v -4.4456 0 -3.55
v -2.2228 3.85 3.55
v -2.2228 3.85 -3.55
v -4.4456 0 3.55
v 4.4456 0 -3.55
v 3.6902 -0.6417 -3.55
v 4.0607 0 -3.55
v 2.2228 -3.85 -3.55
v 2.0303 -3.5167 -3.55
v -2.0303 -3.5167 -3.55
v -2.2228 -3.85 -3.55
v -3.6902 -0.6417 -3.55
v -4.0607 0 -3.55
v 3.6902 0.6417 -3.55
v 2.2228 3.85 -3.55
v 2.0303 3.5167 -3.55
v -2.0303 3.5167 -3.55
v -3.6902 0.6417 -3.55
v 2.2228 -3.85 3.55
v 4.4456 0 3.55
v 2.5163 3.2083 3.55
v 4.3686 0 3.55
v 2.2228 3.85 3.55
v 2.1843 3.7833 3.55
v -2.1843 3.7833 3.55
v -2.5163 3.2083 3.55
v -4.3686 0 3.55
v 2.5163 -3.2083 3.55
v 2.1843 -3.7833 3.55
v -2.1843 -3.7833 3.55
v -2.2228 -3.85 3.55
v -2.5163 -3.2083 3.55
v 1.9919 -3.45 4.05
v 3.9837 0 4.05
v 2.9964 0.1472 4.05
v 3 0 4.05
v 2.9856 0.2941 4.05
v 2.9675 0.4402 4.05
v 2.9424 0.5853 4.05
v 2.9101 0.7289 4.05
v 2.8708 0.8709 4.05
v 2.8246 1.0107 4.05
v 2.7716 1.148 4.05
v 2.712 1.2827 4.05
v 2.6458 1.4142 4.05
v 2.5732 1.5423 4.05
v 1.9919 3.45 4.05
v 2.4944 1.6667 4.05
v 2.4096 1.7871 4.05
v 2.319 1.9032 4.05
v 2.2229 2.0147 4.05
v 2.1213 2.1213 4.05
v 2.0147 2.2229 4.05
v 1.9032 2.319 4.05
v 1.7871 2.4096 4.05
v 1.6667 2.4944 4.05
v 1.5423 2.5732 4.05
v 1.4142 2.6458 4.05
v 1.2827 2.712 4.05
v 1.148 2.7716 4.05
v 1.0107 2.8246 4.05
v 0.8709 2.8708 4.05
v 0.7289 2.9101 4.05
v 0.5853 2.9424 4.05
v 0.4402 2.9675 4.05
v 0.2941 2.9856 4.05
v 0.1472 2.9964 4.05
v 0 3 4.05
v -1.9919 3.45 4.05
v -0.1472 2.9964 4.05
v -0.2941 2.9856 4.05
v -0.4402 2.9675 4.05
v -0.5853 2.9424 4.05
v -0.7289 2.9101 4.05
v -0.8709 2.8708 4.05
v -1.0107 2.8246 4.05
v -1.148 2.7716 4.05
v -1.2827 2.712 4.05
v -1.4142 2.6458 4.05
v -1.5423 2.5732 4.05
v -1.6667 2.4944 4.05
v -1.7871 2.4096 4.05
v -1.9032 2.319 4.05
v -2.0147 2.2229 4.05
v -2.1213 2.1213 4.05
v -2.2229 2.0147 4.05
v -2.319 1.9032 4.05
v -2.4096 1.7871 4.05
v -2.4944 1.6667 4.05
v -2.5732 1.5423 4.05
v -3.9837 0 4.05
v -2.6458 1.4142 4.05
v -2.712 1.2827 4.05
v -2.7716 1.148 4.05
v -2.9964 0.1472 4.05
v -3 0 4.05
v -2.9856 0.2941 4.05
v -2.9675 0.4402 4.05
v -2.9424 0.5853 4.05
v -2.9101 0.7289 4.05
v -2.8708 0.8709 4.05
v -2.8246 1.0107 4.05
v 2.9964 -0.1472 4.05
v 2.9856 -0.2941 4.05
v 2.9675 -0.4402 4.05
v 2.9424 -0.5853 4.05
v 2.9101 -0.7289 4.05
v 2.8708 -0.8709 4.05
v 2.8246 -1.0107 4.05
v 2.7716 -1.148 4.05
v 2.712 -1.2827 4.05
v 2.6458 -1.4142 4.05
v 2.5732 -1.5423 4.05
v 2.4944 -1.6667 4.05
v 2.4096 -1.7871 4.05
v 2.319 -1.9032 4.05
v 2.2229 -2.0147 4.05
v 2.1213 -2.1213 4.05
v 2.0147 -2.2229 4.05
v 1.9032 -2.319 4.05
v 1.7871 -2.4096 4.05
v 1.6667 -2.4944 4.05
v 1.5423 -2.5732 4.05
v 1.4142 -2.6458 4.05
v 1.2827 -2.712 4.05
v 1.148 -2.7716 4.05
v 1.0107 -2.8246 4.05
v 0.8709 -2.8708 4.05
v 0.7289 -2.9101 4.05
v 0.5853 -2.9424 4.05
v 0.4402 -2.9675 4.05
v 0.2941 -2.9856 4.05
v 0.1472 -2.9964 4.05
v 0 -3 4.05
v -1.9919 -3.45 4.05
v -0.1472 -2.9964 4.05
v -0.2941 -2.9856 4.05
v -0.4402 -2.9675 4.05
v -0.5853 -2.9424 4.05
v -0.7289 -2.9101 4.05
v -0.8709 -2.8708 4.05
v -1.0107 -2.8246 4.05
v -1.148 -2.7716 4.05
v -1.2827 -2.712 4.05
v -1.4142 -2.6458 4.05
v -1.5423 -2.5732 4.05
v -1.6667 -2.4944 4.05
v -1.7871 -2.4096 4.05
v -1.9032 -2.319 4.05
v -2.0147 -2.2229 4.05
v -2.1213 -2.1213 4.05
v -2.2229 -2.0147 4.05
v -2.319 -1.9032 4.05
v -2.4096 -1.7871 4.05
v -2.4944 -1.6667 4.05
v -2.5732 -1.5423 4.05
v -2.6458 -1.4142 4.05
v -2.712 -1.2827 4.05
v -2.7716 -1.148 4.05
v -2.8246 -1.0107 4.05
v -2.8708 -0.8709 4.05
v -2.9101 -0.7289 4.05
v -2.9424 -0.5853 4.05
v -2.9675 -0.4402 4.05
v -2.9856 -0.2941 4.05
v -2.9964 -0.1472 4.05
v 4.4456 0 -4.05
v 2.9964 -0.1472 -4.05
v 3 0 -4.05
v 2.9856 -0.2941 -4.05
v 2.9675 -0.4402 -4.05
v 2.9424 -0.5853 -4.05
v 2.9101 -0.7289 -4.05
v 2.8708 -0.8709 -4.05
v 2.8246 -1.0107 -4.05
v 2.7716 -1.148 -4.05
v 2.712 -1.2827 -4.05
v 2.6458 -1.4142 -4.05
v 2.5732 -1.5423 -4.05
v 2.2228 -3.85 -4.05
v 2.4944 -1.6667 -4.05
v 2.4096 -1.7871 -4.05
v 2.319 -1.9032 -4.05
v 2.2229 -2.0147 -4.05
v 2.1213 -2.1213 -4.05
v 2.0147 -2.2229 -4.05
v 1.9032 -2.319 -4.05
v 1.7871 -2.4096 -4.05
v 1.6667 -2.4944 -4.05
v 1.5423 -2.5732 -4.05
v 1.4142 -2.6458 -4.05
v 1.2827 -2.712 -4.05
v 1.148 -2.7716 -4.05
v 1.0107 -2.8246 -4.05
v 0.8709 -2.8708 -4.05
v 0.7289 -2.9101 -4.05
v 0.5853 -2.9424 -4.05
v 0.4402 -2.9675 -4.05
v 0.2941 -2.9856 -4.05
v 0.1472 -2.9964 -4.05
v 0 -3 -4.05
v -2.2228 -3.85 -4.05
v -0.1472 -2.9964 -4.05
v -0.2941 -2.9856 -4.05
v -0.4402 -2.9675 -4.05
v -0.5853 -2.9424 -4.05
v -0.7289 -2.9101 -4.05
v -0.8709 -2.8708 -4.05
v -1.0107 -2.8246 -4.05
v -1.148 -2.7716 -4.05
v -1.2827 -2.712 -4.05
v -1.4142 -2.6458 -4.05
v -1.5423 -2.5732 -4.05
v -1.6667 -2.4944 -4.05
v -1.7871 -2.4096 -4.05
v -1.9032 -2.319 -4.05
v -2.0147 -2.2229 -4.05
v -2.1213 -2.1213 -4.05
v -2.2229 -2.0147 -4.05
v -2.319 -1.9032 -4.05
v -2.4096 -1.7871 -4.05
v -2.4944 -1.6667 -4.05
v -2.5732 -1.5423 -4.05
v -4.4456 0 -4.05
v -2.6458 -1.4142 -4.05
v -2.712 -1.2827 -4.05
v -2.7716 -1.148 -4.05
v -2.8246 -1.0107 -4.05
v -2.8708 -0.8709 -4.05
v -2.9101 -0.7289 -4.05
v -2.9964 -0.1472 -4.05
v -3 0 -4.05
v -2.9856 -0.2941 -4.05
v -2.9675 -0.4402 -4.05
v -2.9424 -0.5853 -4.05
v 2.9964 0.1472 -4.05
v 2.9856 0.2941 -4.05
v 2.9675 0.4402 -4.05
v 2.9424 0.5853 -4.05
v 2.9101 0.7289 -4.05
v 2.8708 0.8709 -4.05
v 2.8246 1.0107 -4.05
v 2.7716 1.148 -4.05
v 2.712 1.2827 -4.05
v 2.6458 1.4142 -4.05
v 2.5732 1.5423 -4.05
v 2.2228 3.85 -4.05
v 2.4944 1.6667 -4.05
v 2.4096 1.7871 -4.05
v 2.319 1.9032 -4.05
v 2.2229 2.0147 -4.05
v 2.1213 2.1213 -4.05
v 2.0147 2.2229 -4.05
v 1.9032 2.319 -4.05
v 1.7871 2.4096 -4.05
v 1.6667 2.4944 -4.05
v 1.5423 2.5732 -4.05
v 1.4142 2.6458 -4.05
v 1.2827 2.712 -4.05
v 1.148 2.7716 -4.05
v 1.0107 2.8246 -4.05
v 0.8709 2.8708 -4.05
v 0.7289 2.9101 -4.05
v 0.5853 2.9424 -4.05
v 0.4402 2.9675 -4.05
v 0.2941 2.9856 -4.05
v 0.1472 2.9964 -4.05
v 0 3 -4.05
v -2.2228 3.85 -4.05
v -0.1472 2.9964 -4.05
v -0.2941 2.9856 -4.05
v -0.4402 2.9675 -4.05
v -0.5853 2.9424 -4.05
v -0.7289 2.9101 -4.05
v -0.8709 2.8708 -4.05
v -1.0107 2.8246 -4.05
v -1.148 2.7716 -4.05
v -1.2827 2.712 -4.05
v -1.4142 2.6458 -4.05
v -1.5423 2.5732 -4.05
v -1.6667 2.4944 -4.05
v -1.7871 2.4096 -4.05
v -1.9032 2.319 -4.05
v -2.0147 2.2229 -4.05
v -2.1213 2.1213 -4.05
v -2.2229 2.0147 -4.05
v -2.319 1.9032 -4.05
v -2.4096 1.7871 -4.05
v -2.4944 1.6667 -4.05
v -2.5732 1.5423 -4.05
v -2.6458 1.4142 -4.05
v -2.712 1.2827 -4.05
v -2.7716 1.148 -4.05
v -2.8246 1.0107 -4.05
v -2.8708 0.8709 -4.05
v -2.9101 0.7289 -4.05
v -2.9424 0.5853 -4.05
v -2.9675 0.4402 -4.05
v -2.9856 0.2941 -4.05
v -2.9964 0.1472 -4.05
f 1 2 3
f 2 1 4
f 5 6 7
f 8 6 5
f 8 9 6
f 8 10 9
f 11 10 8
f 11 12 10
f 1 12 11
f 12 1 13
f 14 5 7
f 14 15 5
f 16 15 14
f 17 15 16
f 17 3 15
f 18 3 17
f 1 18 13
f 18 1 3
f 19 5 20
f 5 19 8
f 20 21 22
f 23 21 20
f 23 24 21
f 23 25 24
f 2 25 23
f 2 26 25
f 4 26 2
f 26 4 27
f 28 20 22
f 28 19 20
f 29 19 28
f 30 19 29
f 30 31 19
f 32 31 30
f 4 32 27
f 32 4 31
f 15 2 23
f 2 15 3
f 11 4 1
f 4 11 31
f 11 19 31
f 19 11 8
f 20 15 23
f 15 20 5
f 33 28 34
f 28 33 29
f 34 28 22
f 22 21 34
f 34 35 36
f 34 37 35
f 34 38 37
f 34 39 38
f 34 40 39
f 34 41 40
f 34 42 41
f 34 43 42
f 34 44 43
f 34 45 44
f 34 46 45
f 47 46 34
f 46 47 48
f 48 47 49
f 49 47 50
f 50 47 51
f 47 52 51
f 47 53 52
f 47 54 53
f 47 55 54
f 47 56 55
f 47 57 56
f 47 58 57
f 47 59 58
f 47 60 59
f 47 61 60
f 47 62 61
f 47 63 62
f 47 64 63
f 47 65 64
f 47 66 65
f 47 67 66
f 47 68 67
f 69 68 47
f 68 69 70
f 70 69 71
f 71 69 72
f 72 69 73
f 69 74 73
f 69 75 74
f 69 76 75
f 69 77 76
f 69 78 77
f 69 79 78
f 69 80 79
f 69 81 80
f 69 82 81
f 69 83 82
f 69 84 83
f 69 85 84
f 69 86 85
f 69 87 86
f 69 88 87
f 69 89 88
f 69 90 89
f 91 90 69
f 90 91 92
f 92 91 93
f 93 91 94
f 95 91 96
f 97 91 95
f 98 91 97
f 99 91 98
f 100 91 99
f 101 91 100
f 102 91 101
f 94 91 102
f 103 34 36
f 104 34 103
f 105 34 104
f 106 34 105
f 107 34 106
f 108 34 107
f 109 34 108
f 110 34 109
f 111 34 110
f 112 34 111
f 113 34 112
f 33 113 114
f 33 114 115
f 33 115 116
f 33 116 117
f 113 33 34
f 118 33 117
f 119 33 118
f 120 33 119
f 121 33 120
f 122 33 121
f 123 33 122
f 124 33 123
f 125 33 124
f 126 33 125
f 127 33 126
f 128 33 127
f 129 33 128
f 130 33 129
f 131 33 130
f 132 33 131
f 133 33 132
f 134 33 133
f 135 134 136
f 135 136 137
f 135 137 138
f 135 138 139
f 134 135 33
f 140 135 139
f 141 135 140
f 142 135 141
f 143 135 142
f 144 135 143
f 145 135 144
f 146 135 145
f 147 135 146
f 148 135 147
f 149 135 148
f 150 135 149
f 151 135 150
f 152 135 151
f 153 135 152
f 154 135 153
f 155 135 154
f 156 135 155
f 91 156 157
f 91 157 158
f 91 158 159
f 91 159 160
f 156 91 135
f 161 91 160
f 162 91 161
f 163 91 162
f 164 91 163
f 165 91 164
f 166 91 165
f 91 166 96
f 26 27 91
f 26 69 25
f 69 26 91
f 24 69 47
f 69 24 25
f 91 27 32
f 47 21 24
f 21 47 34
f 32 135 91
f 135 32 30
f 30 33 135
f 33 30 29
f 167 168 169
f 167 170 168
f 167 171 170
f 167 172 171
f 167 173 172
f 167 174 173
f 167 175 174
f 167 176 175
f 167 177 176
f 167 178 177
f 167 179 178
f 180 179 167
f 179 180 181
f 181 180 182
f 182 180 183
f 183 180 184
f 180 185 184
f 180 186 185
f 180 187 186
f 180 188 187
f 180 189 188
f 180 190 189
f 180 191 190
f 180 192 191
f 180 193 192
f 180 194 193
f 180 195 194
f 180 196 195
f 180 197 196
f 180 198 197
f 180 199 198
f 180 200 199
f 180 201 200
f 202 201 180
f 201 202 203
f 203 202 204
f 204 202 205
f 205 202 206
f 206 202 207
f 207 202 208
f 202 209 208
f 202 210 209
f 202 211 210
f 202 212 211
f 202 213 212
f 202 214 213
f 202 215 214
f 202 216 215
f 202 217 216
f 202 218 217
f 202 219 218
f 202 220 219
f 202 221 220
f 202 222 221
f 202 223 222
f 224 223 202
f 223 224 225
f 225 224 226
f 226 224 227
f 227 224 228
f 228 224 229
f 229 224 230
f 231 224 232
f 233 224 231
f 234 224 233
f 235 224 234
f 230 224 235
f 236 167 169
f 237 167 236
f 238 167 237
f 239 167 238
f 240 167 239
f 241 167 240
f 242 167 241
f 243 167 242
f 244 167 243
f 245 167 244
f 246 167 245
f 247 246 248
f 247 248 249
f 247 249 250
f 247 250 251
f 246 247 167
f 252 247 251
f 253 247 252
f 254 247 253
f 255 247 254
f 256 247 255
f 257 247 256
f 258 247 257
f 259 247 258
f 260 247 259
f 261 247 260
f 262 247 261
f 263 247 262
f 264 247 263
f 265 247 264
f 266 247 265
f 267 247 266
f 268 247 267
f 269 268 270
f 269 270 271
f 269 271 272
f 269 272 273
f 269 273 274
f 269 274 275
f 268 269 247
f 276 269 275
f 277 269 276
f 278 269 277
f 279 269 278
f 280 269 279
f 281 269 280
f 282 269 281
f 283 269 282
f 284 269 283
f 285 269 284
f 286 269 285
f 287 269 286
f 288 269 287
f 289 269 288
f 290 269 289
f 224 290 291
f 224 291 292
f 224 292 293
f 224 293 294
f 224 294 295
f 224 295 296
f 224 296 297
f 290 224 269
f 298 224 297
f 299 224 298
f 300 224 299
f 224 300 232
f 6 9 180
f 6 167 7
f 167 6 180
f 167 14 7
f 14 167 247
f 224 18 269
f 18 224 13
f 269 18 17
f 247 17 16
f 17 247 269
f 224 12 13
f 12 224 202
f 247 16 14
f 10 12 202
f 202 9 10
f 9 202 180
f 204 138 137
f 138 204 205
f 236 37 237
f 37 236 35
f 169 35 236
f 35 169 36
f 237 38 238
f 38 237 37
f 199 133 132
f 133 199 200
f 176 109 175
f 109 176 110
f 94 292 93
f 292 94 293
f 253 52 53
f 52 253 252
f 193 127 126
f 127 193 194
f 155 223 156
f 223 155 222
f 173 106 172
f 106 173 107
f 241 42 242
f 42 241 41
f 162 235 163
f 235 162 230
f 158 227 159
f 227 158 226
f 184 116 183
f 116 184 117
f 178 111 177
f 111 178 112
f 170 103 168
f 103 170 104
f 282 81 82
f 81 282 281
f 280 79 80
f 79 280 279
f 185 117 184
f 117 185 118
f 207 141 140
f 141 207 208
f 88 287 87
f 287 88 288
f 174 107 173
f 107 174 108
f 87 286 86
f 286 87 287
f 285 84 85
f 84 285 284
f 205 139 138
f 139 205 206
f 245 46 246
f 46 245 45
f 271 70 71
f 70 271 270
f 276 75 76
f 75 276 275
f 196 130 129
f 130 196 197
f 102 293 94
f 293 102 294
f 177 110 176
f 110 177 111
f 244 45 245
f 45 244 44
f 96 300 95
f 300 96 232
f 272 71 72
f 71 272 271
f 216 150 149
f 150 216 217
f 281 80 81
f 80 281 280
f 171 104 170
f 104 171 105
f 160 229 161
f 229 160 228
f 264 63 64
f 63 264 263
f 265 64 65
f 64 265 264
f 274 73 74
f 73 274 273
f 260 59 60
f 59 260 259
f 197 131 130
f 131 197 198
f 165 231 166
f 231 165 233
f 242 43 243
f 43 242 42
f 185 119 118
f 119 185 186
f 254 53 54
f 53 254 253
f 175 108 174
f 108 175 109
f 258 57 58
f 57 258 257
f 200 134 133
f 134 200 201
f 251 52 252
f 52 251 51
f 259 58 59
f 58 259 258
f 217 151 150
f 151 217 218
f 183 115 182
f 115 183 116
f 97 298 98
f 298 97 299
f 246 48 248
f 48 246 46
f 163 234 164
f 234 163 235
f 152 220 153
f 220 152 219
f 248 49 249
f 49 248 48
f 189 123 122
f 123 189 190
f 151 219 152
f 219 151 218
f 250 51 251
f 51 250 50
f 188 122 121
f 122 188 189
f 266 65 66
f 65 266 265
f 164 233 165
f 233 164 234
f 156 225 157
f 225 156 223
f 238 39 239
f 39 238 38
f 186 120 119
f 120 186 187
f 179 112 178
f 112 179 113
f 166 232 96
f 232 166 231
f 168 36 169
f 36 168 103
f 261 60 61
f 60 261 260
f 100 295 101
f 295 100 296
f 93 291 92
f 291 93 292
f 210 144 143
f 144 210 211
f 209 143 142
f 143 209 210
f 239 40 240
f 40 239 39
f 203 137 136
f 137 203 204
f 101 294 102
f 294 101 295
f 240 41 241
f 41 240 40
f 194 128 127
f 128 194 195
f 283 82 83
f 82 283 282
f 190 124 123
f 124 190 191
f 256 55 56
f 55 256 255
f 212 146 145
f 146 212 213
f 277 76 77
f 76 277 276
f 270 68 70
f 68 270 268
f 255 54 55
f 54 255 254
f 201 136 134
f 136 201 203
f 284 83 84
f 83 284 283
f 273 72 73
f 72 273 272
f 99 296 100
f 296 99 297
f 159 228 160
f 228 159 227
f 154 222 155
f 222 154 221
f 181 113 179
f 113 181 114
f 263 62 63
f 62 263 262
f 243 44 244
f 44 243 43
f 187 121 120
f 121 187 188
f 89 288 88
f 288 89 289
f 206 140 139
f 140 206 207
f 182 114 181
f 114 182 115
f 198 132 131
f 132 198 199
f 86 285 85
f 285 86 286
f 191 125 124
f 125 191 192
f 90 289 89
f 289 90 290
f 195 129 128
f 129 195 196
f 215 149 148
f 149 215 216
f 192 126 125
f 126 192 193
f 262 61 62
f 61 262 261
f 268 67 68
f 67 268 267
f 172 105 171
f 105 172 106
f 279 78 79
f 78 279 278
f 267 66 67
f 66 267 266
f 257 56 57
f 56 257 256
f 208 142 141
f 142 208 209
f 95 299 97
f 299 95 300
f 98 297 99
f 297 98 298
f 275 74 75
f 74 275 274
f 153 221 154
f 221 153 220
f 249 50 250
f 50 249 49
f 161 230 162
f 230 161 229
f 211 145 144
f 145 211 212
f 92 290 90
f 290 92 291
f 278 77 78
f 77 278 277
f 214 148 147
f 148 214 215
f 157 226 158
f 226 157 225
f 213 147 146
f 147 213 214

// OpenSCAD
// Hex nut: 6.0mm screw, 7.7mm across flats, 7.9mm thick
// One connected solid, clean cylindrical bore

$fn = 128;

// Parameters (mm)
across_flats   = 7.7;
thickness      = 7.9;
hole_diameter  = 6.0;   // clean bore for 6.0mm screw
chamfer        = 0.4;   // edge chamfer height
overlap        = 0.2;   // boolean robustness

// Derived
R_outer = across_flats / sqrt(3);                 // circumradius for given across-flats
R_inner = max(0.01, (across_flats - 2*chamfer) / sqrt(3));

module hex2d(R) {
    polygon(points=[
        [ R, 0],
        [ R/2,  R*sqrt(3)/2],
        [-R/2,  R*sqrt(3)/2],
        [-R, 0],
        [-R/2, -R*sqrt(3)/2],
        [ R/2, -R*sqrt(3)/2]
    ]);
}

module nut_body_with_chamfers() {
    // Build as: middle prism + top frustum + bottom frustum (all connected)
    union() {
        // Middle straight section
        translate([0,0,0])
            linear_extrude(height = max(0.01, thickness - 2*chamfer), center=true)
                hex2d(R_outer);

        // Top chamfer (taper inwards)
        translate([0,0, (thickness/2 - chamfer/2)])
            linear_extrude(height = chamfer + overlap, center=true, scale = R_inner/R_outer)
                hex2d(R_outer);

        // Bottom chamfer (taper inwards)
        translate([0,0, -(thickness/2 - chamfer/2)])
            linear_extrude(height = chamfer + overlap, center=true, scale = R_inner/R_outer)
                hex2d(R_outer);
    }
}

module through_hole() {
    cylinder(d = hole_diameter, h = thickness + 2*overlap, center=true);
}

difference() {
    nut_body_with_chamfers();
    through_hole();
}
